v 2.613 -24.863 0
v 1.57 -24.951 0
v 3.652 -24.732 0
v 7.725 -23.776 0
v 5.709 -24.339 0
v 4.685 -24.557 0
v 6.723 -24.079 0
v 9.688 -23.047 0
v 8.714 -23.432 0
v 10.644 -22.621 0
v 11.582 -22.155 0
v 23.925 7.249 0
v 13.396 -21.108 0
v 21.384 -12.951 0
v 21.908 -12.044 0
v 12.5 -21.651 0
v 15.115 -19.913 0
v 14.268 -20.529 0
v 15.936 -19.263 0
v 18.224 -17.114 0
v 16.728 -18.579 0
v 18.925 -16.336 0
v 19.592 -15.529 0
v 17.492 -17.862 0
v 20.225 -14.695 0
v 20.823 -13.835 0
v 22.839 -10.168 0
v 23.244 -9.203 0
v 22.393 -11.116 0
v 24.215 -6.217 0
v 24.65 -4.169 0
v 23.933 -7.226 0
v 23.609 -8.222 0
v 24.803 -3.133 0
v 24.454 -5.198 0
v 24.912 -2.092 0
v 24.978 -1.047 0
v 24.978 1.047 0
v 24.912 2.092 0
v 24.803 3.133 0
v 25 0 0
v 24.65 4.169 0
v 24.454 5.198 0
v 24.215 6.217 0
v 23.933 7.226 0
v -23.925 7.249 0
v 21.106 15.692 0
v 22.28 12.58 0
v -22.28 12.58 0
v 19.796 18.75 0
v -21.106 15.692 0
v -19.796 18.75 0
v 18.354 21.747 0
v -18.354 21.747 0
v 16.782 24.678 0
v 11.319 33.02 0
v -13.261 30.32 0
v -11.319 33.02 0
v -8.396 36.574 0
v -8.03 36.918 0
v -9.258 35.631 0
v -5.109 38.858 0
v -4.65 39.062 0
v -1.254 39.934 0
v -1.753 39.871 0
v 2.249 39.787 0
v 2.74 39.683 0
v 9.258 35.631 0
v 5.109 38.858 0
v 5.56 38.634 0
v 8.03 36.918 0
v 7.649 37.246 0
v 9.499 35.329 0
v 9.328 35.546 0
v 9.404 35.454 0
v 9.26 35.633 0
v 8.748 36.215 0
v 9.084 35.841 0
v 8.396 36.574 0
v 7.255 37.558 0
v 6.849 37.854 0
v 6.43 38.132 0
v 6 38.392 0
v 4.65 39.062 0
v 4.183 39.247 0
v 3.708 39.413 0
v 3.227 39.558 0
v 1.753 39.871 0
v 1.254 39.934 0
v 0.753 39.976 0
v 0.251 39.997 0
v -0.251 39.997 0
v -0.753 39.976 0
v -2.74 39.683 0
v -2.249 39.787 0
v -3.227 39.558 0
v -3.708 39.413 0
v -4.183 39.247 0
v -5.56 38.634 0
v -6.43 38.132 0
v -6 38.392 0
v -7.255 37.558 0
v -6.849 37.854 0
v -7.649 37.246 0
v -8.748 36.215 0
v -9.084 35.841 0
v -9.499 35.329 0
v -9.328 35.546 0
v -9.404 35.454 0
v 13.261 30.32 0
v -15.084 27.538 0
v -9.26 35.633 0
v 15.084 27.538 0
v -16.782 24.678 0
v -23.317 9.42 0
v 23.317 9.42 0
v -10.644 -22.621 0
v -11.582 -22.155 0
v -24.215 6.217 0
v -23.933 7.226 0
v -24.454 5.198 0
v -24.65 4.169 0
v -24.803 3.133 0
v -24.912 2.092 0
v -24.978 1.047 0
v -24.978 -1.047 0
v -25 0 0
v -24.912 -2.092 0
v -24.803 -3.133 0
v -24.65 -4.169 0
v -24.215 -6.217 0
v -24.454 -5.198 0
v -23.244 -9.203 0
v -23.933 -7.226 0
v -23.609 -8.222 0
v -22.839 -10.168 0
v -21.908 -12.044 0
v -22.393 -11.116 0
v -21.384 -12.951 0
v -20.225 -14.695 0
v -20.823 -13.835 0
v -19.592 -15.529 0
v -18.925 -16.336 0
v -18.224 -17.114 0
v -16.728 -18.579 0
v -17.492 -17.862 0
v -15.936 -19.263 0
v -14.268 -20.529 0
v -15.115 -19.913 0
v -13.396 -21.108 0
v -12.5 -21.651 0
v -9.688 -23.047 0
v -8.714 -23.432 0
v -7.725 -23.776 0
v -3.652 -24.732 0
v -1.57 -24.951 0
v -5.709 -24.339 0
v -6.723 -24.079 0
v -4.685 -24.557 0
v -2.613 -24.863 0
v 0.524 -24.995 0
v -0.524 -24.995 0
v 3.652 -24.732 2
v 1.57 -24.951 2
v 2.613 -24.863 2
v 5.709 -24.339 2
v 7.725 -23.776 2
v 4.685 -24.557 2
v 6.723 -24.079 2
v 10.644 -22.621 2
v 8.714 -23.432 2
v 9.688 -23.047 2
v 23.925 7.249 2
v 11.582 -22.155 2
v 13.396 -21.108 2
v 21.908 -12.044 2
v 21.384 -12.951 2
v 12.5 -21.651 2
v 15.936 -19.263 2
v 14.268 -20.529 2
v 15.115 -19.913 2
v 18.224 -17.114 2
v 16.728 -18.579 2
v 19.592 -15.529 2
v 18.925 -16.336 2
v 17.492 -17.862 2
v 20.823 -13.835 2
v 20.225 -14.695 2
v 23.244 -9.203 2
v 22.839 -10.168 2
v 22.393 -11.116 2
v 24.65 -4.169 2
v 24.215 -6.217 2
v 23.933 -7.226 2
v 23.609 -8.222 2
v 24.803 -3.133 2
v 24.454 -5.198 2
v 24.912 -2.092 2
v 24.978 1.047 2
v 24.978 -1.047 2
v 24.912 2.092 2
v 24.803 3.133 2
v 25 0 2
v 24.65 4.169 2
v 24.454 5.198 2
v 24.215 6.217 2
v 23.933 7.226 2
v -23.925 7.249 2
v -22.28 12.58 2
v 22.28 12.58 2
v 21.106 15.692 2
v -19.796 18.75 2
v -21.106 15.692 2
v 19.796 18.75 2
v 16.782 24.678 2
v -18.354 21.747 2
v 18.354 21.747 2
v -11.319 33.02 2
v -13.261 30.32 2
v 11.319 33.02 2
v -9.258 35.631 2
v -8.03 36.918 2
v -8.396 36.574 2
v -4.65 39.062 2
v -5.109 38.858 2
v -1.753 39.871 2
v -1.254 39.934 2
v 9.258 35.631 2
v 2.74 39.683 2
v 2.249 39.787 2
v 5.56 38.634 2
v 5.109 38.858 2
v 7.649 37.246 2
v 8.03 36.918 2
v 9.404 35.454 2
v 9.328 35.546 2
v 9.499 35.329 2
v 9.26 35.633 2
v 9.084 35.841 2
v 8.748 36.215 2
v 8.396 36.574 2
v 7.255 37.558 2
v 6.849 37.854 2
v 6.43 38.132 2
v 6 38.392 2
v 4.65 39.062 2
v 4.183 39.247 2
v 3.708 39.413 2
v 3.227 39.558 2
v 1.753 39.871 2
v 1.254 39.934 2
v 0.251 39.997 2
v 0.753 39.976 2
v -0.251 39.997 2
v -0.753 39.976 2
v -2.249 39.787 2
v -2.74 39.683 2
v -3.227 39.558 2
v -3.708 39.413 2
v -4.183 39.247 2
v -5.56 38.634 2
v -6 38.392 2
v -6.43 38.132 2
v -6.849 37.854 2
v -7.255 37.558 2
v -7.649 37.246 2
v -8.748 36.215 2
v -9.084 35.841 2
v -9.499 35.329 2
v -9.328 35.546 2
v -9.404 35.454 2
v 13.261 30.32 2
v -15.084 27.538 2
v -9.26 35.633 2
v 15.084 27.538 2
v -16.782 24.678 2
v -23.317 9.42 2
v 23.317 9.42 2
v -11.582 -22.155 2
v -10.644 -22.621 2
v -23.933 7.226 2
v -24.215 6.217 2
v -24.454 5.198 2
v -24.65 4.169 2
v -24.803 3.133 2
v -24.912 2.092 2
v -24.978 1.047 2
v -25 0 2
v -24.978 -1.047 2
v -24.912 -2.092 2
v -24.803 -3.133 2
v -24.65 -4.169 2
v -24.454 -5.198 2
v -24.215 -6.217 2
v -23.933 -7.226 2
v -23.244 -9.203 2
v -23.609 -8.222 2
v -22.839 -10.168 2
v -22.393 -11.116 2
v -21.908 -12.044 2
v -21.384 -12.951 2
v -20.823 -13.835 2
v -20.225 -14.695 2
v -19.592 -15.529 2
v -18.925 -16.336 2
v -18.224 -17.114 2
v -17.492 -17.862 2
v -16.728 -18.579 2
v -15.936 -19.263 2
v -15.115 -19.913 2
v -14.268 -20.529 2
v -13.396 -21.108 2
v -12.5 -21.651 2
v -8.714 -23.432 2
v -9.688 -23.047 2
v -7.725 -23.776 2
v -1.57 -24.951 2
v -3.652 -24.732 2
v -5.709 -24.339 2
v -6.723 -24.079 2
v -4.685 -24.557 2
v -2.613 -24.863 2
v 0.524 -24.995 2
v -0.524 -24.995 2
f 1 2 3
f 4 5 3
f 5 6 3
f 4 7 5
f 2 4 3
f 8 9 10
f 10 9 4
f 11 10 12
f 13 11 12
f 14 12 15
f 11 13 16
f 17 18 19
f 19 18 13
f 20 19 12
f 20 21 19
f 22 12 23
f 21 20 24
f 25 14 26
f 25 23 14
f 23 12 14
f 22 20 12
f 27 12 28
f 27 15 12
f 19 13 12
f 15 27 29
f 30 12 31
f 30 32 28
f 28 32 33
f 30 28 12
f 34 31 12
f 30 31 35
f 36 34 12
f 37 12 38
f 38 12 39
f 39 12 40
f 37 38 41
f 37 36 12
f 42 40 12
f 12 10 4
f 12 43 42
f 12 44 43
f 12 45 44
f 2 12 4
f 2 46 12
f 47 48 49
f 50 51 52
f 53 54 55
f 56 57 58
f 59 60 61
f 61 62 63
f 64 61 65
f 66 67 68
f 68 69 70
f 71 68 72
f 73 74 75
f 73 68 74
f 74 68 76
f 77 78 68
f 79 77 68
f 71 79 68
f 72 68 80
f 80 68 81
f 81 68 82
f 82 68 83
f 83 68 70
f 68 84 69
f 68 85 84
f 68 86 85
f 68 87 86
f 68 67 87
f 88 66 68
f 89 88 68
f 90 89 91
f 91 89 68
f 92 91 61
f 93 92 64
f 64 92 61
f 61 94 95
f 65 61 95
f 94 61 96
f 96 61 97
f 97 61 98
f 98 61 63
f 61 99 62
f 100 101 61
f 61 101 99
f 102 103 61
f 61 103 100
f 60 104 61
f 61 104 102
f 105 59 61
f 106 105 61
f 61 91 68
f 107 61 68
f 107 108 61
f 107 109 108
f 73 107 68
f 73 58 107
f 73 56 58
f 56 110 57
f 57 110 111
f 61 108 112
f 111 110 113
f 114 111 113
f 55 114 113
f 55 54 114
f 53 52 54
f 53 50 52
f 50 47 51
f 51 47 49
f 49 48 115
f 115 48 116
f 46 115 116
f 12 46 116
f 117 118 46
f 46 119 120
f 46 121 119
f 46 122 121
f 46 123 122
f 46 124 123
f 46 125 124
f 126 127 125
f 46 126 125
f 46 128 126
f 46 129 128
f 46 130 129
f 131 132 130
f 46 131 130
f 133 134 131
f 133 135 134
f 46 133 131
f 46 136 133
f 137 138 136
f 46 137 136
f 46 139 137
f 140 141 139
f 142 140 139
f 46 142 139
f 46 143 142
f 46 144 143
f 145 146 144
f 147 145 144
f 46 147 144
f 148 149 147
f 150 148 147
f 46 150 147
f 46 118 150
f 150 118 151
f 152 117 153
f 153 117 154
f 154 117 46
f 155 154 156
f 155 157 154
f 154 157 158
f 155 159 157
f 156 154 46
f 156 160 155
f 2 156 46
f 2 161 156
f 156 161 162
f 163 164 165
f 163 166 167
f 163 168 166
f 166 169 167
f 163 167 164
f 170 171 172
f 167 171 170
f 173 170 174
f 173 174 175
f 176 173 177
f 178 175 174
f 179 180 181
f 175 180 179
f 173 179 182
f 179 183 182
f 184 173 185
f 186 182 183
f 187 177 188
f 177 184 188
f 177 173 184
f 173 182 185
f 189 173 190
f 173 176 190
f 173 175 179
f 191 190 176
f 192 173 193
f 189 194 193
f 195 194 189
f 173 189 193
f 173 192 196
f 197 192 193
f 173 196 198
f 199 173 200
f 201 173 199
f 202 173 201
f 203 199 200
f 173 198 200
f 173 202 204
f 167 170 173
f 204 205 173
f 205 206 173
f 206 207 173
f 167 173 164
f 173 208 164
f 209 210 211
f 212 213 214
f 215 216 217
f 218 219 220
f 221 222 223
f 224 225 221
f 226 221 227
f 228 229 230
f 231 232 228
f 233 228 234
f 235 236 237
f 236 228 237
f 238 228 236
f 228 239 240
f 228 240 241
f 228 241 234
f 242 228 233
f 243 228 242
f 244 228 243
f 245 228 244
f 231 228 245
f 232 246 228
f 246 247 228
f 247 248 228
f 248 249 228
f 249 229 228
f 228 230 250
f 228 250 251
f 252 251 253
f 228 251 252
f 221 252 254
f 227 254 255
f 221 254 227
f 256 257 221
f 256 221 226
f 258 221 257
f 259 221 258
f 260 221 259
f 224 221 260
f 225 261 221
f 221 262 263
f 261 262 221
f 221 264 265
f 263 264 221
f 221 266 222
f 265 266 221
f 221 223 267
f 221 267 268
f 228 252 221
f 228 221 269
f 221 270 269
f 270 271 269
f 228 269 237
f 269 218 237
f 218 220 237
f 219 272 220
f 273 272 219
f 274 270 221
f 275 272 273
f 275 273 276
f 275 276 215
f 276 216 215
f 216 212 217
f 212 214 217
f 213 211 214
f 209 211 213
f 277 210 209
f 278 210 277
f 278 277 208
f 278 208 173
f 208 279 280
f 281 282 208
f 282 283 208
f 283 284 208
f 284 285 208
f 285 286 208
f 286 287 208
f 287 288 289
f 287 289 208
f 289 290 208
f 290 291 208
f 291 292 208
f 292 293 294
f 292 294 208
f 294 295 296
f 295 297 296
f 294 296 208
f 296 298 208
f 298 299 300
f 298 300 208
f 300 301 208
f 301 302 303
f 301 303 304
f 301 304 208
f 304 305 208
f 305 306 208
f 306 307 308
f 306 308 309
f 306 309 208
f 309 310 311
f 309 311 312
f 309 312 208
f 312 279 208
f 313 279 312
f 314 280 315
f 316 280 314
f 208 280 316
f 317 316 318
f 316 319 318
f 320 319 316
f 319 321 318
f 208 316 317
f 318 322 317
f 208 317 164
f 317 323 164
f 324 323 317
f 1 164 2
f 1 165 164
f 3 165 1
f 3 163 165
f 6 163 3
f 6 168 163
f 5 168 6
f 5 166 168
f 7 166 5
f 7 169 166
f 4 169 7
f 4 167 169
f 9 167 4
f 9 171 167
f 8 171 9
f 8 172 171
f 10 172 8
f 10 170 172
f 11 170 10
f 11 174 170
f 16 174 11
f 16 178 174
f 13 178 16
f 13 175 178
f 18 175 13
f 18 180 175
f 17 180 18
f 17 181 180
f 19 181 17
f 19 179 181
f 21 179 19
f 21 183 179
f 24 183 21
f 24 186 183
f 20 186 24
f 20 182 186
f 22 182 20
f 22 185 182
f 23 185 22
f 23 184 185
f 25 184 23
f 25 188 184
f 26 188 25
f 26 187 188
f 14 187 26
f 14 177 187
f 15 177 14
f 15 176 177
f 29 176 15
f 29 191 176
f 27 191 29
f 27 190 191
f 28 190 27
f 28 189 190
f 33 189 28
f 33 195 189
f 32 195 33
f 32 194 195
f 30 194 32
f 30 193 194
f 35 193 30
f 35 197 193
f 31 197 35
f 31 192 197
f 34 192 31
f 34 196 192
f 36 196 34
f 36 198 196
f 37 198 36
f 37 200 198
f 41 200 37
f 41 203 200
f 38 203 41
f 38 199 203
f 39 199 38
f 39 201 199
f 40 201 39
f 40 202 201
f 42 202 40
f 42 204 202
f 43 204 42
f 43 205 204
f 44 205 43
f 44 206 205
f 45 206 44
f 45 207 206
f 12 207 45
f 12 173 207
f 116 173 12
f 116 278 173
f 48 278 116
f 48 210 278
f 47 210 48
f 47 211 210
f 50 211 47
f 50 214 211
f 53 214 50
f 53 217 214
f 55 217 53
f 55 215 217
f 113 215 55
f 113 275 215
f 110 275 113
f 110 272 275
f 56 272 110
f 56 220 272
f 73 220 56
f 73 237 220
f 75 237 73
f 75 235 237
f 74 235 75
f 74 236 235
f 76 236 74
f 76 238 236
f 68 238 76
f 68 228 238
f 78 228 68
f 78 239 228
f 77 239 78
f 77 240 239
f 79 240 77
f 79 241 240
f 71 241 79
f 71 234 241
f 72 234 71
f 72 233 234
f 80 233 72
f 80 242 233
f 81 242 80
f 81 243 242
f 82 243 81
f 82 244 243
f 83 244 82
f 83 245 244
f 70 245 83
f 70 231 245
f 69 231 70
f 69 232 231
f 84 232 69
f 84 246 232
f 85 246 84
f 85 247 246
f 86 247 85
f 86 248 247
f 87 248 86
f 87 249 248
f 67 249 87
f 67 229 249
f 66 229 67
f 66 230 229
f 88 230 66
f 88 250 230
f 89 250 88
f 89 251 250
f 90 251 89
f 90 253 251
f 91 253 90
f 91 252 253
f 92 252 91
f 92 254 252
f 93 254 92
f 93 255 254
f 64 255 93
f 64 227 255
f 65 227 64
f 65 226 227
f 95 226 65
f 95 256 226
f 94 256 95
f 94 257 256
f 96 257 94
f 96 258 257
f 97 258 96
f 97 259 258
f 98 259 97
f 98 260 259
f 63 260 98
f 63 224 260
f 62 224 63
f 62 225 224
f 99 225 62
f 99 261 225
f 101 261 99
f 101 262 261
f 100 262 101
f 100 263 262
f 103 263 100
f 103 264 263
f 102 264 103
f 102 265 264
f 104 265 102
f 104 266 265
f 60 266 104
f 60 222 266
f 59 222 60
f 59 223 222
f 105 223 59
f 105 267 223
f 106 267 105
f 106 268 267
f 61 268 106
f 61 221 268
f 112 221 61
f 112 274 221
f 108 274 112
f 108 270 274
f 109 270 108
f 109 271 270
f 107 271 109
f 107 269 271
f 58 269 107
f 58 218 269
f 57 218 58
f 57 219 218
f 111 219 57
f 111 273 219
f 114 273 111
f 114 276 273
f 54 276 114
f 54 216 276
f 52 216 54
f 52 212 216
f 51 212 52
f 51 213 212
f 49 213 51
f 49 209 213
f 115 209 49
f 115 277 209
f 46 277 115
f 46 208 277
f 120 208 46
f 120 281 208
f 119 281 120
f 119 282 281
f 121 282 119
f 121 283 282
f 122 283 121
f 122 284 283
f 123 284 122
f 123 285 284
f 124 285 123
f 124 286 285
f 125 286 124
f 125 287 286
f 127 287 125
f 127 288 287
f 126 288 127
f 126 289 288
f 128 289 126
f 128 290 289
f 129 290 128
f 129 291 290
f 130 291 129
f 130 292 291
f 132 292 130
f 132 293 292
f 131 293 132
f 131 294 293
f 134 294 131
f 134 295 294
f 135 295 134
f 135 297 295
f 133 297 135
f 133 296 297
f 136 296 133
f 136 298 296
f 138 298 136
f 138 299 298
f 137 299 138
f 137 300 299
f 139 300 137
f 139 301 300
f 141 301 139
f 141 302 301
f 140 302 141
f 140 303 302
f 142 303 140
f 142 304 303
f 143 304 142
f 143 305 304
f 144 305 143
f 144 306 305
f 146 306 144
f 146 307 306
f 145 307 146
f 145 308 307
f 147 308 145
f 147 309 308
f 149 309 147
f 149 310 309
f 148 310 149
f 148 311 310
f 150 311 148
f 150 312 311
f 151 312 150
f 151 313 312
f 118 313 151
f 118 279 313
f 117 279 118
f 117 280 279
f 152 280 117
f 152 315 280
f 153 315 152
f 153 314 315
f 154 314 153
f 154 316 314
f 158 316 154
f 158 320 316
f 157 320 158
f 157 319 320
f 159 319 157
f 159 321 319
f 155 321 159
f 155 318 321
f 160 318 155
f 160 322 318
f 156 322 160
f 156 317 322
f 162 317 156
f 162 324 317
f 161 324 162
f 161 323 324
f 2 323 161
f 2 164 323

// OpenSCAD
/*
  two-circular-arc cam generator by Knochi (mail@knochi.de)
  design from dimensionless variables based on research article of Emre Arabaci
  https://ms.copernicus.org/articles/10/497/2019/ms-10-497-2019.html
*/

$fn=150;
sMax=15; //maximum lift

/* [Dimensionless Design Variables] */
//λ=r2/r
lambda=0.48; //[0.00:0.01:1.00]
//µ=θmax/π
mu=0.42;     //[0.00:0.01:0.50]
//ψ=sMax/r (ψ>λ)
psi=0.6;    //[0.00:0.01:1.00] 


linear_extrude(2) twoCircArcCam(sMax,lambda,mu,psi);

module twoCircArcCam(sMax=15,lambda=0.48,mu=0.42,psi=0.6){
  
  //constrain design variables
  lambda = (lambda<1) ? lambda : 1;
  mu = (mu<1) ? mu : 0.5;
  psi = (psi<1) ? (psi>lambda) ? psi : lambda : 1; //must be smaller than 1 but larger then lambda
  
  //calc from design variables
  r=sMax/psi;    //check!
  r2=r*lambda;   //check!
  theta0=mu*180; //check!

  //dimensions
  b2=sMax+r-r2; //check!

  b1Cntr=sMax*(2*b2-sMax);
  b1Dnmtr=2*(b2*(1-cos(theta0))-sMax);
  b1=b1Cntr/b1Dnmtr;      

  //angles
  theta1=asin(sin(theta0)*b2/(b1+r-r2));
  theta2=asin(sin(theta0)*b1/(b1+r-r2));
  
  //center of 1st Arc
  M1=polToCart(90-theta0,b1);
  
  circle(r);
  translate([0,b2]) circle(r2);

  for (im=[0,1])
    mirror([im,0]) intersection(){
      square([r,b2+r2]);
      translate(-M1) rotate(90-theta0) arc(b1+r,theta1);
    }
}

module arc(r=1,angle=60){
  //draws a closed arc shape from zero to target angle 
  //with same amount of fragments rotate_extrude(angle) would produce but with 2D output

  n= arcFragments(r,angle);
  polygon(arcPoints(r,angle,n));
}


// -- functions --
//harmonic motion
function sFromPhi(phi,sMax,beta)=
  sMax/2*(1-cos((PI*phi)/beta));

function polToCart(phi,r)= 
[r* cos(phi), r* sin(phi)];
  

function arcFragments(r,angle)=
  let(
    cirFrac=360/angle, //fraction of angle
    frgFrmFn= floor($fn/cirFrac), //fragments for arc calculated from fn
    minFrag=3 //minimum Fragments
  ) ($fn>minFrag) ? max(frgFrmFn,minFrag)+1 : ceil(max(min(angle/$fa,r*(2*PI/cirFrac)/$fs),minFrag));

//arc with constant radius
function arcPoints(r=1,angle=60,steps=10,poly=[[0,0]],iter)=
  let(
    iter = (iter == undef) ? steps-1 : iter,
    angInc=angle/(steps-1), //increment per step
    x= r*cos(angInc*iter),
    y= r*sin(angInc*iter)
  )(iter>=0) ? arcPoints(r,angle,steps,concat(poly,[[x,y]]),iter-1) : poly;
  
